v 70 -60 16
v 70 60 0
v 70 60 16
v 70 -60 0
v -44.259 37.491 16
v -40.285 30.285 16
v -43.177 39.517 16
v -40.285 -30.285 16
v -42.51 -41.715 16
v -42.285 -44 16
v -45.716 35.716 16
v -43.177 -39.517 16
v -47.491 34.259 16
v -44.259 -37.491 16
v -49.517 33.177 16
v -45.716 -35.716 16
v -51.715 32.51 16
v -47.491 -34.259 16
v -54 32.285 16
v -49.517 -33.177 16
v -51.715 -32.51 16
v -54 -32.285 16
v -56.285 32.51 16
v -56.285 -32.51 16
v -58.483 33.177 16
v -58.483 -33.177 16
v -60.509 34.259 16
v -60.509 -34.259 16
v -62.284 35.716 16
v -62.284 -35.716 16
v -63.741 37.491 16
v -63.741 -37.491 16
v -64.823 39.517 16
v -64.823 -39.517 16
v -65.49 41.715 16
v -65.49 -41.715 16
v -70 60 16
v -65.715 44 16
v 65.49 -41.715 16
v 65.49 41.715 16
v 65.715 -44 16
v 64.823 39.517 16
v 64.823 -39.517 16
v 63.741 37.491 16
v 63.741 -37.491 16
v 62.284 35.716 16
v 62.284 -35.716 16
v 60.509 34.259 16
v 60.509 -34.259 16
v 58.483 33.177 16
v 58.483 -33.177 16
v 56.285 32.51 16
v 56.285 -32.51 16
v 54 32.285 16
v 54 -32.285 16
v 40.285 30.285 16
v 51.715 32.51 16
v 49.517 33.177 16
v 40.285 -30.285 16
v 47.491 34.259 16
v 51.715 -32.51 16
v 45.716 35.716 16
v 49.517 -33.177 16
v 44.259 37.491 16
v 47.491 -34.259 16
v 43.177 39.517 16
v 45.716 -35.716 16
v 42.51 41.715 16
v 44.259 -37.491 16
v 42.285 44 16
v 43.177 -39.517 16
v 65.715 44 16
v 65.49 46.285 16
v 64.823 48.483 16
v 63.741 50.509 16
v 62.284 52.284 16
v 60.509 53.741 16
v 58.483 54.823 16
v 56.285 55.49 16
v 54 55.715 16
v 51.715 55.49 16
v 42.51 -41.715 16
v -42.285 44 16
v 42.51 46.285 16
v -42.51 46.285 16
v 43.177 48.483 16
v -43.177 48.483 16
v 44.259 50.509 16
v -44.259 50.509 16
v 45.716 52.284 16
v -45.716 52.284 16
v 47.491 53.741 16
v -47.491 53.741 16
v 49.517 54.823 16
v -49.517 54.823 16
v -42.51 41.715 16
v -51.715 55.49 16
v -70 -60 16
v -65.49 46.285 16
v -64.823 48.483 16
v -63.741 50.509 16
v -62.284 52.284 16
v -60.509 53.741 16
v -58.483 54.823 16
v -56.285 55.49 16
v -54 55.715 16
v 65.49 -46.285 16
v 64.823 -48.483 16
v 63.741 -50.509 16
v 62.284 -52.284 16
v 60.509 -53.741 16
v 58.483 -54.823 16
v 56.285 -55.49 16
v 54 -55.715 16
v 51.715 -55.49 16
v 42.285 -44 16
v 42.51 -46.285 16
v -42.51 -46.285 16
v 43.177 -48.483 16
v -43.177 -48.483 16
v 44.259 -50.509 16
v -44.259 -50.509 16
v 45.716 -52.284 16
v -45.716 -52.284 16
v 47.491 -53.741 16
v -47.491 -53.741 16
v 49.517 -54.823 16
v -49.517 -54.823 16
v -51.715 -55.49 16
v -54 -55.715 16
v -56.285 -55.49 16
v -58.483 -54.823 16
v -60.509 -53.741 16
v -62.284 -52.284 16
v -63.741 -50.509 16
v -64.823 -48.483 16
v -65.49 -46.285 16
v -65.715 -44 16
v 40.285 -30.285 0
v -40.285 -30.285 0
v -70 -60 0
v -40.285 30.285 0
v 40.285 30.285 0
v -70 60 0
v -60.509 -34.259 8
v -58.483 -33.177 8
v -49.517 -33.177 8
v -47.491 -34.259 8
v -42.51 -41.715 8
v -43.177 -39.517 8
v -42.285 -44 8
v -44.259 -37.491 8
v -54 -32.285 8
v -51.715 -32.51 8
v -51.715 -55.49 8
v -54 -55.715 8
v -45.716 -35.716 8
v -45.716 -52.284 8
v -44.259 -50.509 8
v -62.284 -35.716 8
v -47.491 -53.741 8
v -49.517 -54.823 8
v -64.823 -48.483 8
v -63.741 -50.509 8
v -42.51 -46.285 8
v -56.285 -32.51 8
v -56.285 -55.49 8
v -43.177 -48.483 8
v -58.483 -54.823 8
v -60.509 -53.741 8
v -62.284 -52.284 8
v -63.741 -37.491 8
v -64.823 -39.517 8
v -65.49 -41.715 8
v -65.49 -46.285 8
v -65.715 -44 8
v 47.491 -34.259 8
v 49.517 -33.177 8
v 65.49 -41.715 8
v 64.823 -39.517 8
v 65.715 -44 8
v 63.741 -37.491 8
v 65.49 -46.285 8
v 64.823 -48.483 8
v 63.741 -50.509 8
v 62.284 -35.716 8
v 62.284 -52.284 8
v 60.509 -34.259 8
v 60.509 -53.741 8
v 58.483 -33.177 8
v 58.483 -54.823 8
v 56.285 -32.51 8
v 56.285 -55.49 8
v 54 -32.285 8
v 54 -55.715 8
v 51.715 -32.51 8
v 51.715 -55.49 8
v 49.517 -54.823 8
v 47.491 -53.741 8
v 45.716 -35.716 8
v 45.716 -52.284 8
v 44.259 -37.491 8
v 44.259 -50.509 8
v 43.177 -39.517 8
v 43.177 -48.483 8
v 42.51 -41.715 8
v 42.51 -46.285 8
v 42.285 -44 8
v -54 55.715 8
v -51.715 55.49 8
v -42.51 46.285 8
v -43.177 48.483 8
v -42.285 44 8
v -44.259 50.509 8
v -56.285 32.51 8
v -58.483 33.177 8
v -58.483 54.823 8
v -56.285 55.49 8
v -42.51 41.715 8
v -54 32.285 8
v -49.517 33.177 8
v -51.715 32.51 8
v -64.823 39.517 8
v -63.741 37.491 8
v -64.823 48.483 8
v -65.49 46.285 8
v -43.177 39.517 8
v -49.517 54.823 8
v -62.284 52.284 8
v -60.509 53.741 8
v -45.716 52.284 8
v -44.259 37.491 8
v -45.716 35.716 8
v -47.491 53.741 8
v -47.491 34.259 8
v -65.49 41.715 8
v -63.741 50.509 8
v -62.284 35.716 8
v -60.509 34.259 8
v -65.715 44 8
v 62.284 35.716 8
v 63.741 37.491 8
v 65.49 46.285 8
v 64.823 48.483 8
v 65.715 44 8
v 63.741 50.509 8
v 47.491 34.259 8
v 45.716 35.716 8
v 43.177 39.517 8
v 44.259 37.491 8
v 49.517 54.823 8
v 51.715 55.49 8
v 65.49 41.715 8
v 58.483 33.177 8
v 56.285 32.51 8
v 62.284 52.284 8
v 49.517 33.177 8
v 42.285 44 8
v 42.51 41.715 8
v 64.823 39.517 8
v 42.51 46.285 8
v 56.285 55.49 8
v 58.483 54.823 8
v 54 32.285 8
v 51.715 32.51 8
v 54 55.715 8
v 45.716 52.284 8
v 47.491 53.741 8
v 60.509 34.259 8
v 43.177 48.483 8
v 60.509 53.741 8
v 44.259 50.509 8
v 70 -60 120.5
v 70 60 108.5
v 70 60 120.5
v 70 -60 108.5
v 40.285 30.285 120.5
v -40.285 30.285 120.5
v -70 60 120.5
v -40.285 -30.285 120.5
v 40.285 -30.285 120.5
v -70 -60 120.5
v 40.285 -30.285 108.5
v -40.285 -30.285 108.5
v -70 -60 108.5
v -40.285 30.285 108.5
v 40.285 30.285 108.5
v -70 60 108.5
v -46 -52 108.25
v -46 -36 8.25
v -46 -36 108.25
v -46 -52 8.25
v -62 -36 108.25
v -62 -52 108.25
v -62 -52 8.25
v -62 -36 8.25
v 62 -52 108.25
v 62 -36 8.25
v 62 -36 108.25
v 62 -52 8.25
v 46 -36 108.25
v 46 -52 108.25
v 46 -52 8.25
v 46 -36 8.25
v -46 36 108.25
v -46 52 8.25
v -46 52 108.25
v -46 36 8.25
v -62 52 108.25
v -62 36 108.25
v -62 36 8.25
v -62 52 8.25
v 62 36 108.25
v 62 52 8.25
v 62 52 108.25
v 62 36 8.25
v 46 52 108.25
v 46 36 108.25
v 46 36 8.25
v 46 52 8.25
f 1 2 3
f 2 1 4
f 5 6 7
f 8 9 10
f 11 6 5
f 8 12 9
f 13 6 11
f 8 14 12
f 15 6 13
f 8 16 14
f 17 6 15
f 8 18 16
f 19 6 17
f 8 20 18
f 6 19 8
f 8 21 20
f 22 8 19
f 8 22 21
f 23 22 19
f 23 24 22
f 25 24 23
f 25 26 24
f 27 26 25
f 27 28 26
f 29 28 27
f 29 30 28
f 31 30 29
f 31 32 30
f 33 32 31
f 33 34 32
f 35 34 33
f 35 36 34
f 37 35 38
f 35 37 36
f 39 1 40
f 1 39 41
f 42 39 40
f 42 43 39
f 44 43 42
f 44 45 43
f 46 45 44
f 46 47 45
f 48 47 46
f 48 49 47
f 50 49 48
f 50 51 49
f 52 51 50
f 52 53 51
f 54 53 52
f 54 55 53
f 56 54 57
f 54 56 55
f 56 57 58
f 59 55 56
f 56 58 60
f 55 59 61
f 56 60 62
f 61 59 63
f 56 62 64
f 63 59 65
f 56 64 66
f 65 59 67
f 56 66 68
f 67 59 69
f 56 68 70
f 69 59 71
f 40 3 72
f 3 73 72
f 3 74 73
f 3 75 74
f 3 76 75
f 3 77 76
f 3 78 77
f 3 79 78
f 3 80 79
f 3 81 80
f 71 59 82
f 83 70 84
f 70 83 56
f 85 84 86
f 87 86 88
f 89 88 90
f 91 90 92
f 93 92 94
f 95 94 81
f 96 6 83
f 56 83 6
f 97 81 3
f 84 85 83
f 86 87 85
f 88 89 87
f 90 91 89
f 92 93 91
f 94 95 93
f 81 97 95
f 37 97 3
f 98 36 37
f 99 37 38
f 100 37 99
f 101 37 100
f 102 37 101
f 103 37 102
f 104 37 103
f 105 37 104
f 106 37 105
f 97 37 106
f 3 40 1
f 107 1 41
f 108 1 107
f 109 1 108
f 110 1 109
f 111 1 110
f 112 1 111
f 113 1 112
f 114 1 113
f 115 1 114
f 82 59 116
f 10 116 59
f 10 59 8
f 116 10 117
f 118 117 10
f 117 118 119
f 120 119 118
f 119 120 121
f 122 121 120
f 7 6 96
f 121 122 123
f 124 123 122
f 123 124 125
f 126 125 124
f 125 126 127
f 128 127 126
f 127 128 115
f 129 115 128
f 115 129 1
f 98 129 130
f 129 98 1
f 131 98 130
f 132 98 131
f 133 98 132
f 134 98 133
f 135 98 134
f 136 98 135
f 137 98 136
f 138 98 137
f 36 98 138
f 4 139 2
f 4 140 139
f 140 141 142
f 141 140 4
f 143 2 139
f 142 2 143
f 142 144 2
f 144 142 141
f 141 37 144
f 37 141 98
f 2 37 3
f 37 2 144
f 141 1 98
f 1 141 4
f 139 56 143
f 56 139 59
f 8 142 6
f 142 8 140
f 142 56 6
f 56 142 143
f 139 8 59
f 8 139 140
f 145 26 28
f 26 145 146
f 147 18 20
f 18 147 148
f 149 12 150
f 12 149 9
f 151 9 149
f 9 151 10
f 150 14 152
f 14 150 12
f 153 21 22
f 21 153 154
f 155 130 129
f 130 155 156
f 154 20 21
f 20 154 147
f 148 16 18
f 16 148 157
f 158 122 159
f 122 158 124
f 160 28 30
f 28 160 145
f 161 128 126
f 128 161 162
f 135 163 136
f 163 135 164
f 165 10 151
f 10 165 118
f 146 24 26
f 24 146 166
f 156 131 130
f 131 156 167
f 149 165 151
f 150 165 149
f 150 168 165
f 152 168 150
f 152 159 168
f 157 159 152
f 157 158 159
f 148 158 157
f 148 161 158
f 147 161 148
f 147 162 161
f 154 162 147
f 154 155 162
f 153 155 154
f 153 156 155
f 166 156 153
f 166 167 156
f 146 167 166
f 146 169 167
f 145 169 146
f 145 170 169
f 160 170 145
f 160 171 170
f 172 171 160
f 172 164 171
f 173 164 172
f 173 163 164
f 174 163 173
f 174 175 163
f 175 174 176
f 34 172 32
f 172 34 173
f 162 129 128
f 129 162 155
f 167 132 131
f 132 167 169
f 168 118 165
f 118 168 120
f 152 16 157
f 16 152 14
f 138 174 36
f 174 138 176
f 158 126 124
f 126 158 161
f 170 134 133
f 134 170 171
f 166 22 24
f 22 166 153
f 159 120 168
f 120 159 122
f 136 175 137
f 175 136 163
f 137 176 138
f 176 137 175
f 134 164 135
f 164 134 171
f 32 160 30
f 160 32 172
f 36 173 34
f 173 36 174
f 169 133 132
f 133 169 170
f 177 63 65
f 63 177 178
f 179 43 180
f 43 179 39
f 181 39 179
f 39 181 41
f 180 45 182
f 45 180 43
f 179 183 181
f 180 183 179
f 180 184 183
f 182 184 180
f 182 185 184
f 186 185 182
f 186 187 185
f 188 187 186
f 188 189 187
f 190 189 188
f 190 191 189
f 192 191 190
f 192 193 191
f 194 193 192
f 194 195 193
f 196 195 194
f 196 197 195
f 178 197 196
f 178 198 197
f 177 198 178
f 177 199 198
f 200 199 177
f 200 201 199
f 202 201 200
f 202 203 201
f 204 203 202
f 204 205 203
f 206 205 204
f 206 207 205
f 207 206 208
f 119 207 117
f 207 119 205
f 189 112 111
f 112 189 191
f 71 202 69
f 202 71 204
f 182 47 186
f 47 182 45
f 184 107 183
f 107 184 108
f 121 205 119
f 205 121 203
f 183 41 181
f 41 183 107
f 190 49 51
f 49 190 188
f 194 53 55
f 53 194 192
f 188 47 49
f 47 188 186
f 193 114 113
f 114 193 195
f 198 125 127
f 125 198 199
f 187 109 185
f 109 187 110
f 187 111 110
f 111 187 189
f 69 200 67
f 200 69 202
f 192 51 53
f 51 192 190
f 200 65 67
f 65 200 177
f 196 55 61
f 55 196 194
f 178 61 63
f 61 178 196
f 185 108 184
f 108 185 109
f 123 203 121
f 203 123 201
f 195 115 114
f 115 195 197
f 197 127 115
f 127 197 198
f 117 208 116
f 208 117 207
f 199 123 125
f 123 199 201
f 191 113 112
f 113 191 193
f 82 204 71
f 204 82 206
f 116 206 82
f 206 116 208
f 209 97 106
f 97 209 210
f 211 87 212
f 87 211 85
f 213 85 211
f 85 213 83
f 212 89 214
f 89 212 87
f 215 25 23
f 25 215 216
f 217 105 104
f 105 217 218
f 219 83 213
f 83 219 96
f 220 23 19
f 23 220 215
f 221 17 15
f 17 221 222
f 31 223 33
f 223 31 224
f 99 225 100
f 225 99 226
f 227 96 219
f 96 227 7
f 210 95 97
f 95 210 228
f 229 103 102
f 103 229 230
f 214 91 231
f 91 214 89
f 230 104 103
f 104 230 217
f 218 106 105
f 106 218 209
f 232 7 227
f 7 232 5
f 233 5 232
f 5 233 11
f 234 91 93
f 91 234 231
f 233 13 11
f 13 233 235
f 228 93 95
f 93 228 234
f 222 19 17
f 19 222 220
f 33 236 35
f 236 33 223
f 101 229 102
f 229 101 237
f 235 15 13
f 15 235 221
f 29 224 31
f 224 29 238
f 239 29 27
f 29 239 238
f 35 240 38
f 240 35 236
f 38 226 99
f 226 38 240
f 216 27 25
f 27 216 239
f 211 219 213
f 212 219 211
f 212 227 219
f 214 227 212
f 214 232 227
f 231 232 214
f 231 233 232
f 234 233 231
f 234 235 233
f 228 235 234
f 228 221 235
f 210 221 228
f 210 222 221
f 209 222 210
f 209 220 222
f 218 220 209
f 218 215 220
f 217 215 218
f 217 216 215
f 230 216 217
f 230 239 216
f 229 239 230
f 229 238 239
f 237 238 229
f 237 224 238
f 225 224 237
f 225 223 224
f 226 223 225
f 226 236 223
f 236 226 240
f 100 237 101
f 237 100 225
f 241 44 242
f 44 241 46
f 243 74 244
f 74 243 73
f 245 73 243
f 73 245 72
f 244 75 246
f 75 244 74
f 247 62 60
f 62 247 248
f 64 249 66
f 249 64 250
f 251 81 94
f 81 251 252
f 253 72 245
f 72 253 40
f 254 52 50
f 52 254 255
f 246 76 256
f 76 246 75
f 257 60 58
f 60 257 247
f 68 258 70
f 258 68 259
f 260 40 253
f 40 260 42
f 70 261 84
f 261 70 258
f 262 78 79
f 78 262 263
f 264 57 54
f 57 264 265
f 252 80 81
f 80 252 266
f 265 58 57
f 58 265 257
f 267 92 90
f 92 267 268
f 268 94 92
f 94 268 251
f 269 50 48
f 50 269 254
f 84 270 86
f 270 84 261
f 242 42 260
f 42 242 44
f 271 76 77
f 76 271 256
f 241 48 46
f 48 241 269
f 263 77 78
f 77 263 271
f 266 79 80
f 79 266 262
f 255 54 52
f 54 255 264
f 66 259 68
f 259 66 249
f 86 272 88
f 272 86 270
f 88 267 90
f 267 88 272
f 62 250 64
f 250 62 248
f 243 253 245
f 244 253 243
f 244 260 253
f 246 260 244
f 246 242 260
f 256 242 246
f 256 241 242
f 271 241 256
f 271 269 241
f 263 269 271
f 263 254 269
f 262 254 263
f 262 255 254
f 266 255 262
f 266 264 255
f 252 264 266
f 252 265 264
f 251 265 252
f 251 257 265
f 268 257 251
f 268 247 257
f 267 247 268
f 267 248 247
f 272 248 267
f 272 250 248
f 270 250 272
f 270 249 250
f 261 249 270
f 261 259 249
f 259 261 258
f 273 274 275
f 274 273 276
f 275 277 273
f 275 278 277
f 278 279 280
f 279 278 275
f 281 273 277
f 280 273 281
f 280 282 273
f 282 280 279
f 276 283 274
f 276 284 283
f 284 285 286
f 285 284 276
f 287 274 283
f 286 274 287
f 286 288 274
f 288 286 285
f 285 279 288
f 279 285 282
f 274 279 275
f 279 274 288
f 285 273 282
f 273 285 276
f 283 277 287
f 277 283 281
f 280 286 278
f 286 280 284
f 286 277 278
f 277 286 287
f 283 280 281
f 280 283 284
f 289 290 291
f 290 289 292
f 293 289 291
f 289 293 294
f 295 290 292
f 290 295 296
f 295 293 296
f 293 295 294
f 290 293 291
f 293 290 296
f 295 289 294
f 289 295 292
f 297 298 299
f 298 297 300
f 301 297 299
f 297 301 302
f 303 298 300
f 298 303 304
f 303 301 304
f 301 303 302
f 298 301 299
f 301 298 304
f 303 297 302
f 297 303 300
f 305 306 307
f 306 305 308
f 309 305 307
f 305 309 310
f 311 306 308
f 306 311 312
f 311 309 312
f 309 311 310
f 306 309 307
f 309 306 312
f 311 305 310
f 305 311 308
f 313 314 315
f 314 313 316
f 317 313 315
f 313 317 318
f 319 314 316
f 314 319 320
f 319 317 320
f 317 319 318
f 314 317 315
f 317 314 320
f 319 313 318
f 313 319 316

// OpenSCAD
$fn = 32;

// ------------------------------------------------------------------------
// Frame cube: base 140 x 120 mm, posts 100 mm tall
// Every part is its own module, assembly() places every instance.
// ------------------------------------------------------------------------

// --- part 1 ---
module base_frame() {
  difference() {
    translate([-70, -60, 0]) cube([140, 120, 16]);
    translate([-40.285, -30.285, -1]) cube([80.57, 60.57, 18]);
    translate([-54, -44, 8]) cylinder(h = 9, d = 23.43);
    translate([54, -44, 8]) cylinder(h = 9, d = 23.43);
    translate([-54, 44, 8]) cylinder(h = 9, d = 23.43);
    translate([54, 44, 8]) cylinder(h = 9, d = 23.43);
  }
}

// --- part 2 ---
module corner_post() {
  translate([-8, -8, 0]) cube([16, 16, 100]);
}

// --- part 3 ---
module top_frame() {
  difference() {
    translate([-70, -60, 0]) cube([140, 120, 12]);
    translate([-40.285, -30.285, -1]) cube([80.57, 60.57, 14]);
  }
}

// --- assembly ---
module assembly() {
  color([0.80, 0.24, 0.20]) translate([0, 0, 0]) rotate([0, 0, 0]) base_frame();
  color([0.20, 0.45, 0.75]) translate([-54, -44, 8.25]) rotate([0, 0, 0]) corner_post();
  color([0.25, 0.62, 0.32]) translate([54, -44, 8.25]) rotate([0, 0, 0]) corner_post();
  color([0.92, 0.70, 0.18]) translate([-54, 44, 8.25]) rotate([0, 0, 0]) corner_post();
  color([0.58, 0.35, 0.70]) translate([54, 44, 8.25]) rotate([0, 0, 0]) corner_post();
  color([0.16, 0.66, 0.66]) translate([0, 0, 108.5]) rotate([0, 0, 0]) top_frame();
}

assembly();
